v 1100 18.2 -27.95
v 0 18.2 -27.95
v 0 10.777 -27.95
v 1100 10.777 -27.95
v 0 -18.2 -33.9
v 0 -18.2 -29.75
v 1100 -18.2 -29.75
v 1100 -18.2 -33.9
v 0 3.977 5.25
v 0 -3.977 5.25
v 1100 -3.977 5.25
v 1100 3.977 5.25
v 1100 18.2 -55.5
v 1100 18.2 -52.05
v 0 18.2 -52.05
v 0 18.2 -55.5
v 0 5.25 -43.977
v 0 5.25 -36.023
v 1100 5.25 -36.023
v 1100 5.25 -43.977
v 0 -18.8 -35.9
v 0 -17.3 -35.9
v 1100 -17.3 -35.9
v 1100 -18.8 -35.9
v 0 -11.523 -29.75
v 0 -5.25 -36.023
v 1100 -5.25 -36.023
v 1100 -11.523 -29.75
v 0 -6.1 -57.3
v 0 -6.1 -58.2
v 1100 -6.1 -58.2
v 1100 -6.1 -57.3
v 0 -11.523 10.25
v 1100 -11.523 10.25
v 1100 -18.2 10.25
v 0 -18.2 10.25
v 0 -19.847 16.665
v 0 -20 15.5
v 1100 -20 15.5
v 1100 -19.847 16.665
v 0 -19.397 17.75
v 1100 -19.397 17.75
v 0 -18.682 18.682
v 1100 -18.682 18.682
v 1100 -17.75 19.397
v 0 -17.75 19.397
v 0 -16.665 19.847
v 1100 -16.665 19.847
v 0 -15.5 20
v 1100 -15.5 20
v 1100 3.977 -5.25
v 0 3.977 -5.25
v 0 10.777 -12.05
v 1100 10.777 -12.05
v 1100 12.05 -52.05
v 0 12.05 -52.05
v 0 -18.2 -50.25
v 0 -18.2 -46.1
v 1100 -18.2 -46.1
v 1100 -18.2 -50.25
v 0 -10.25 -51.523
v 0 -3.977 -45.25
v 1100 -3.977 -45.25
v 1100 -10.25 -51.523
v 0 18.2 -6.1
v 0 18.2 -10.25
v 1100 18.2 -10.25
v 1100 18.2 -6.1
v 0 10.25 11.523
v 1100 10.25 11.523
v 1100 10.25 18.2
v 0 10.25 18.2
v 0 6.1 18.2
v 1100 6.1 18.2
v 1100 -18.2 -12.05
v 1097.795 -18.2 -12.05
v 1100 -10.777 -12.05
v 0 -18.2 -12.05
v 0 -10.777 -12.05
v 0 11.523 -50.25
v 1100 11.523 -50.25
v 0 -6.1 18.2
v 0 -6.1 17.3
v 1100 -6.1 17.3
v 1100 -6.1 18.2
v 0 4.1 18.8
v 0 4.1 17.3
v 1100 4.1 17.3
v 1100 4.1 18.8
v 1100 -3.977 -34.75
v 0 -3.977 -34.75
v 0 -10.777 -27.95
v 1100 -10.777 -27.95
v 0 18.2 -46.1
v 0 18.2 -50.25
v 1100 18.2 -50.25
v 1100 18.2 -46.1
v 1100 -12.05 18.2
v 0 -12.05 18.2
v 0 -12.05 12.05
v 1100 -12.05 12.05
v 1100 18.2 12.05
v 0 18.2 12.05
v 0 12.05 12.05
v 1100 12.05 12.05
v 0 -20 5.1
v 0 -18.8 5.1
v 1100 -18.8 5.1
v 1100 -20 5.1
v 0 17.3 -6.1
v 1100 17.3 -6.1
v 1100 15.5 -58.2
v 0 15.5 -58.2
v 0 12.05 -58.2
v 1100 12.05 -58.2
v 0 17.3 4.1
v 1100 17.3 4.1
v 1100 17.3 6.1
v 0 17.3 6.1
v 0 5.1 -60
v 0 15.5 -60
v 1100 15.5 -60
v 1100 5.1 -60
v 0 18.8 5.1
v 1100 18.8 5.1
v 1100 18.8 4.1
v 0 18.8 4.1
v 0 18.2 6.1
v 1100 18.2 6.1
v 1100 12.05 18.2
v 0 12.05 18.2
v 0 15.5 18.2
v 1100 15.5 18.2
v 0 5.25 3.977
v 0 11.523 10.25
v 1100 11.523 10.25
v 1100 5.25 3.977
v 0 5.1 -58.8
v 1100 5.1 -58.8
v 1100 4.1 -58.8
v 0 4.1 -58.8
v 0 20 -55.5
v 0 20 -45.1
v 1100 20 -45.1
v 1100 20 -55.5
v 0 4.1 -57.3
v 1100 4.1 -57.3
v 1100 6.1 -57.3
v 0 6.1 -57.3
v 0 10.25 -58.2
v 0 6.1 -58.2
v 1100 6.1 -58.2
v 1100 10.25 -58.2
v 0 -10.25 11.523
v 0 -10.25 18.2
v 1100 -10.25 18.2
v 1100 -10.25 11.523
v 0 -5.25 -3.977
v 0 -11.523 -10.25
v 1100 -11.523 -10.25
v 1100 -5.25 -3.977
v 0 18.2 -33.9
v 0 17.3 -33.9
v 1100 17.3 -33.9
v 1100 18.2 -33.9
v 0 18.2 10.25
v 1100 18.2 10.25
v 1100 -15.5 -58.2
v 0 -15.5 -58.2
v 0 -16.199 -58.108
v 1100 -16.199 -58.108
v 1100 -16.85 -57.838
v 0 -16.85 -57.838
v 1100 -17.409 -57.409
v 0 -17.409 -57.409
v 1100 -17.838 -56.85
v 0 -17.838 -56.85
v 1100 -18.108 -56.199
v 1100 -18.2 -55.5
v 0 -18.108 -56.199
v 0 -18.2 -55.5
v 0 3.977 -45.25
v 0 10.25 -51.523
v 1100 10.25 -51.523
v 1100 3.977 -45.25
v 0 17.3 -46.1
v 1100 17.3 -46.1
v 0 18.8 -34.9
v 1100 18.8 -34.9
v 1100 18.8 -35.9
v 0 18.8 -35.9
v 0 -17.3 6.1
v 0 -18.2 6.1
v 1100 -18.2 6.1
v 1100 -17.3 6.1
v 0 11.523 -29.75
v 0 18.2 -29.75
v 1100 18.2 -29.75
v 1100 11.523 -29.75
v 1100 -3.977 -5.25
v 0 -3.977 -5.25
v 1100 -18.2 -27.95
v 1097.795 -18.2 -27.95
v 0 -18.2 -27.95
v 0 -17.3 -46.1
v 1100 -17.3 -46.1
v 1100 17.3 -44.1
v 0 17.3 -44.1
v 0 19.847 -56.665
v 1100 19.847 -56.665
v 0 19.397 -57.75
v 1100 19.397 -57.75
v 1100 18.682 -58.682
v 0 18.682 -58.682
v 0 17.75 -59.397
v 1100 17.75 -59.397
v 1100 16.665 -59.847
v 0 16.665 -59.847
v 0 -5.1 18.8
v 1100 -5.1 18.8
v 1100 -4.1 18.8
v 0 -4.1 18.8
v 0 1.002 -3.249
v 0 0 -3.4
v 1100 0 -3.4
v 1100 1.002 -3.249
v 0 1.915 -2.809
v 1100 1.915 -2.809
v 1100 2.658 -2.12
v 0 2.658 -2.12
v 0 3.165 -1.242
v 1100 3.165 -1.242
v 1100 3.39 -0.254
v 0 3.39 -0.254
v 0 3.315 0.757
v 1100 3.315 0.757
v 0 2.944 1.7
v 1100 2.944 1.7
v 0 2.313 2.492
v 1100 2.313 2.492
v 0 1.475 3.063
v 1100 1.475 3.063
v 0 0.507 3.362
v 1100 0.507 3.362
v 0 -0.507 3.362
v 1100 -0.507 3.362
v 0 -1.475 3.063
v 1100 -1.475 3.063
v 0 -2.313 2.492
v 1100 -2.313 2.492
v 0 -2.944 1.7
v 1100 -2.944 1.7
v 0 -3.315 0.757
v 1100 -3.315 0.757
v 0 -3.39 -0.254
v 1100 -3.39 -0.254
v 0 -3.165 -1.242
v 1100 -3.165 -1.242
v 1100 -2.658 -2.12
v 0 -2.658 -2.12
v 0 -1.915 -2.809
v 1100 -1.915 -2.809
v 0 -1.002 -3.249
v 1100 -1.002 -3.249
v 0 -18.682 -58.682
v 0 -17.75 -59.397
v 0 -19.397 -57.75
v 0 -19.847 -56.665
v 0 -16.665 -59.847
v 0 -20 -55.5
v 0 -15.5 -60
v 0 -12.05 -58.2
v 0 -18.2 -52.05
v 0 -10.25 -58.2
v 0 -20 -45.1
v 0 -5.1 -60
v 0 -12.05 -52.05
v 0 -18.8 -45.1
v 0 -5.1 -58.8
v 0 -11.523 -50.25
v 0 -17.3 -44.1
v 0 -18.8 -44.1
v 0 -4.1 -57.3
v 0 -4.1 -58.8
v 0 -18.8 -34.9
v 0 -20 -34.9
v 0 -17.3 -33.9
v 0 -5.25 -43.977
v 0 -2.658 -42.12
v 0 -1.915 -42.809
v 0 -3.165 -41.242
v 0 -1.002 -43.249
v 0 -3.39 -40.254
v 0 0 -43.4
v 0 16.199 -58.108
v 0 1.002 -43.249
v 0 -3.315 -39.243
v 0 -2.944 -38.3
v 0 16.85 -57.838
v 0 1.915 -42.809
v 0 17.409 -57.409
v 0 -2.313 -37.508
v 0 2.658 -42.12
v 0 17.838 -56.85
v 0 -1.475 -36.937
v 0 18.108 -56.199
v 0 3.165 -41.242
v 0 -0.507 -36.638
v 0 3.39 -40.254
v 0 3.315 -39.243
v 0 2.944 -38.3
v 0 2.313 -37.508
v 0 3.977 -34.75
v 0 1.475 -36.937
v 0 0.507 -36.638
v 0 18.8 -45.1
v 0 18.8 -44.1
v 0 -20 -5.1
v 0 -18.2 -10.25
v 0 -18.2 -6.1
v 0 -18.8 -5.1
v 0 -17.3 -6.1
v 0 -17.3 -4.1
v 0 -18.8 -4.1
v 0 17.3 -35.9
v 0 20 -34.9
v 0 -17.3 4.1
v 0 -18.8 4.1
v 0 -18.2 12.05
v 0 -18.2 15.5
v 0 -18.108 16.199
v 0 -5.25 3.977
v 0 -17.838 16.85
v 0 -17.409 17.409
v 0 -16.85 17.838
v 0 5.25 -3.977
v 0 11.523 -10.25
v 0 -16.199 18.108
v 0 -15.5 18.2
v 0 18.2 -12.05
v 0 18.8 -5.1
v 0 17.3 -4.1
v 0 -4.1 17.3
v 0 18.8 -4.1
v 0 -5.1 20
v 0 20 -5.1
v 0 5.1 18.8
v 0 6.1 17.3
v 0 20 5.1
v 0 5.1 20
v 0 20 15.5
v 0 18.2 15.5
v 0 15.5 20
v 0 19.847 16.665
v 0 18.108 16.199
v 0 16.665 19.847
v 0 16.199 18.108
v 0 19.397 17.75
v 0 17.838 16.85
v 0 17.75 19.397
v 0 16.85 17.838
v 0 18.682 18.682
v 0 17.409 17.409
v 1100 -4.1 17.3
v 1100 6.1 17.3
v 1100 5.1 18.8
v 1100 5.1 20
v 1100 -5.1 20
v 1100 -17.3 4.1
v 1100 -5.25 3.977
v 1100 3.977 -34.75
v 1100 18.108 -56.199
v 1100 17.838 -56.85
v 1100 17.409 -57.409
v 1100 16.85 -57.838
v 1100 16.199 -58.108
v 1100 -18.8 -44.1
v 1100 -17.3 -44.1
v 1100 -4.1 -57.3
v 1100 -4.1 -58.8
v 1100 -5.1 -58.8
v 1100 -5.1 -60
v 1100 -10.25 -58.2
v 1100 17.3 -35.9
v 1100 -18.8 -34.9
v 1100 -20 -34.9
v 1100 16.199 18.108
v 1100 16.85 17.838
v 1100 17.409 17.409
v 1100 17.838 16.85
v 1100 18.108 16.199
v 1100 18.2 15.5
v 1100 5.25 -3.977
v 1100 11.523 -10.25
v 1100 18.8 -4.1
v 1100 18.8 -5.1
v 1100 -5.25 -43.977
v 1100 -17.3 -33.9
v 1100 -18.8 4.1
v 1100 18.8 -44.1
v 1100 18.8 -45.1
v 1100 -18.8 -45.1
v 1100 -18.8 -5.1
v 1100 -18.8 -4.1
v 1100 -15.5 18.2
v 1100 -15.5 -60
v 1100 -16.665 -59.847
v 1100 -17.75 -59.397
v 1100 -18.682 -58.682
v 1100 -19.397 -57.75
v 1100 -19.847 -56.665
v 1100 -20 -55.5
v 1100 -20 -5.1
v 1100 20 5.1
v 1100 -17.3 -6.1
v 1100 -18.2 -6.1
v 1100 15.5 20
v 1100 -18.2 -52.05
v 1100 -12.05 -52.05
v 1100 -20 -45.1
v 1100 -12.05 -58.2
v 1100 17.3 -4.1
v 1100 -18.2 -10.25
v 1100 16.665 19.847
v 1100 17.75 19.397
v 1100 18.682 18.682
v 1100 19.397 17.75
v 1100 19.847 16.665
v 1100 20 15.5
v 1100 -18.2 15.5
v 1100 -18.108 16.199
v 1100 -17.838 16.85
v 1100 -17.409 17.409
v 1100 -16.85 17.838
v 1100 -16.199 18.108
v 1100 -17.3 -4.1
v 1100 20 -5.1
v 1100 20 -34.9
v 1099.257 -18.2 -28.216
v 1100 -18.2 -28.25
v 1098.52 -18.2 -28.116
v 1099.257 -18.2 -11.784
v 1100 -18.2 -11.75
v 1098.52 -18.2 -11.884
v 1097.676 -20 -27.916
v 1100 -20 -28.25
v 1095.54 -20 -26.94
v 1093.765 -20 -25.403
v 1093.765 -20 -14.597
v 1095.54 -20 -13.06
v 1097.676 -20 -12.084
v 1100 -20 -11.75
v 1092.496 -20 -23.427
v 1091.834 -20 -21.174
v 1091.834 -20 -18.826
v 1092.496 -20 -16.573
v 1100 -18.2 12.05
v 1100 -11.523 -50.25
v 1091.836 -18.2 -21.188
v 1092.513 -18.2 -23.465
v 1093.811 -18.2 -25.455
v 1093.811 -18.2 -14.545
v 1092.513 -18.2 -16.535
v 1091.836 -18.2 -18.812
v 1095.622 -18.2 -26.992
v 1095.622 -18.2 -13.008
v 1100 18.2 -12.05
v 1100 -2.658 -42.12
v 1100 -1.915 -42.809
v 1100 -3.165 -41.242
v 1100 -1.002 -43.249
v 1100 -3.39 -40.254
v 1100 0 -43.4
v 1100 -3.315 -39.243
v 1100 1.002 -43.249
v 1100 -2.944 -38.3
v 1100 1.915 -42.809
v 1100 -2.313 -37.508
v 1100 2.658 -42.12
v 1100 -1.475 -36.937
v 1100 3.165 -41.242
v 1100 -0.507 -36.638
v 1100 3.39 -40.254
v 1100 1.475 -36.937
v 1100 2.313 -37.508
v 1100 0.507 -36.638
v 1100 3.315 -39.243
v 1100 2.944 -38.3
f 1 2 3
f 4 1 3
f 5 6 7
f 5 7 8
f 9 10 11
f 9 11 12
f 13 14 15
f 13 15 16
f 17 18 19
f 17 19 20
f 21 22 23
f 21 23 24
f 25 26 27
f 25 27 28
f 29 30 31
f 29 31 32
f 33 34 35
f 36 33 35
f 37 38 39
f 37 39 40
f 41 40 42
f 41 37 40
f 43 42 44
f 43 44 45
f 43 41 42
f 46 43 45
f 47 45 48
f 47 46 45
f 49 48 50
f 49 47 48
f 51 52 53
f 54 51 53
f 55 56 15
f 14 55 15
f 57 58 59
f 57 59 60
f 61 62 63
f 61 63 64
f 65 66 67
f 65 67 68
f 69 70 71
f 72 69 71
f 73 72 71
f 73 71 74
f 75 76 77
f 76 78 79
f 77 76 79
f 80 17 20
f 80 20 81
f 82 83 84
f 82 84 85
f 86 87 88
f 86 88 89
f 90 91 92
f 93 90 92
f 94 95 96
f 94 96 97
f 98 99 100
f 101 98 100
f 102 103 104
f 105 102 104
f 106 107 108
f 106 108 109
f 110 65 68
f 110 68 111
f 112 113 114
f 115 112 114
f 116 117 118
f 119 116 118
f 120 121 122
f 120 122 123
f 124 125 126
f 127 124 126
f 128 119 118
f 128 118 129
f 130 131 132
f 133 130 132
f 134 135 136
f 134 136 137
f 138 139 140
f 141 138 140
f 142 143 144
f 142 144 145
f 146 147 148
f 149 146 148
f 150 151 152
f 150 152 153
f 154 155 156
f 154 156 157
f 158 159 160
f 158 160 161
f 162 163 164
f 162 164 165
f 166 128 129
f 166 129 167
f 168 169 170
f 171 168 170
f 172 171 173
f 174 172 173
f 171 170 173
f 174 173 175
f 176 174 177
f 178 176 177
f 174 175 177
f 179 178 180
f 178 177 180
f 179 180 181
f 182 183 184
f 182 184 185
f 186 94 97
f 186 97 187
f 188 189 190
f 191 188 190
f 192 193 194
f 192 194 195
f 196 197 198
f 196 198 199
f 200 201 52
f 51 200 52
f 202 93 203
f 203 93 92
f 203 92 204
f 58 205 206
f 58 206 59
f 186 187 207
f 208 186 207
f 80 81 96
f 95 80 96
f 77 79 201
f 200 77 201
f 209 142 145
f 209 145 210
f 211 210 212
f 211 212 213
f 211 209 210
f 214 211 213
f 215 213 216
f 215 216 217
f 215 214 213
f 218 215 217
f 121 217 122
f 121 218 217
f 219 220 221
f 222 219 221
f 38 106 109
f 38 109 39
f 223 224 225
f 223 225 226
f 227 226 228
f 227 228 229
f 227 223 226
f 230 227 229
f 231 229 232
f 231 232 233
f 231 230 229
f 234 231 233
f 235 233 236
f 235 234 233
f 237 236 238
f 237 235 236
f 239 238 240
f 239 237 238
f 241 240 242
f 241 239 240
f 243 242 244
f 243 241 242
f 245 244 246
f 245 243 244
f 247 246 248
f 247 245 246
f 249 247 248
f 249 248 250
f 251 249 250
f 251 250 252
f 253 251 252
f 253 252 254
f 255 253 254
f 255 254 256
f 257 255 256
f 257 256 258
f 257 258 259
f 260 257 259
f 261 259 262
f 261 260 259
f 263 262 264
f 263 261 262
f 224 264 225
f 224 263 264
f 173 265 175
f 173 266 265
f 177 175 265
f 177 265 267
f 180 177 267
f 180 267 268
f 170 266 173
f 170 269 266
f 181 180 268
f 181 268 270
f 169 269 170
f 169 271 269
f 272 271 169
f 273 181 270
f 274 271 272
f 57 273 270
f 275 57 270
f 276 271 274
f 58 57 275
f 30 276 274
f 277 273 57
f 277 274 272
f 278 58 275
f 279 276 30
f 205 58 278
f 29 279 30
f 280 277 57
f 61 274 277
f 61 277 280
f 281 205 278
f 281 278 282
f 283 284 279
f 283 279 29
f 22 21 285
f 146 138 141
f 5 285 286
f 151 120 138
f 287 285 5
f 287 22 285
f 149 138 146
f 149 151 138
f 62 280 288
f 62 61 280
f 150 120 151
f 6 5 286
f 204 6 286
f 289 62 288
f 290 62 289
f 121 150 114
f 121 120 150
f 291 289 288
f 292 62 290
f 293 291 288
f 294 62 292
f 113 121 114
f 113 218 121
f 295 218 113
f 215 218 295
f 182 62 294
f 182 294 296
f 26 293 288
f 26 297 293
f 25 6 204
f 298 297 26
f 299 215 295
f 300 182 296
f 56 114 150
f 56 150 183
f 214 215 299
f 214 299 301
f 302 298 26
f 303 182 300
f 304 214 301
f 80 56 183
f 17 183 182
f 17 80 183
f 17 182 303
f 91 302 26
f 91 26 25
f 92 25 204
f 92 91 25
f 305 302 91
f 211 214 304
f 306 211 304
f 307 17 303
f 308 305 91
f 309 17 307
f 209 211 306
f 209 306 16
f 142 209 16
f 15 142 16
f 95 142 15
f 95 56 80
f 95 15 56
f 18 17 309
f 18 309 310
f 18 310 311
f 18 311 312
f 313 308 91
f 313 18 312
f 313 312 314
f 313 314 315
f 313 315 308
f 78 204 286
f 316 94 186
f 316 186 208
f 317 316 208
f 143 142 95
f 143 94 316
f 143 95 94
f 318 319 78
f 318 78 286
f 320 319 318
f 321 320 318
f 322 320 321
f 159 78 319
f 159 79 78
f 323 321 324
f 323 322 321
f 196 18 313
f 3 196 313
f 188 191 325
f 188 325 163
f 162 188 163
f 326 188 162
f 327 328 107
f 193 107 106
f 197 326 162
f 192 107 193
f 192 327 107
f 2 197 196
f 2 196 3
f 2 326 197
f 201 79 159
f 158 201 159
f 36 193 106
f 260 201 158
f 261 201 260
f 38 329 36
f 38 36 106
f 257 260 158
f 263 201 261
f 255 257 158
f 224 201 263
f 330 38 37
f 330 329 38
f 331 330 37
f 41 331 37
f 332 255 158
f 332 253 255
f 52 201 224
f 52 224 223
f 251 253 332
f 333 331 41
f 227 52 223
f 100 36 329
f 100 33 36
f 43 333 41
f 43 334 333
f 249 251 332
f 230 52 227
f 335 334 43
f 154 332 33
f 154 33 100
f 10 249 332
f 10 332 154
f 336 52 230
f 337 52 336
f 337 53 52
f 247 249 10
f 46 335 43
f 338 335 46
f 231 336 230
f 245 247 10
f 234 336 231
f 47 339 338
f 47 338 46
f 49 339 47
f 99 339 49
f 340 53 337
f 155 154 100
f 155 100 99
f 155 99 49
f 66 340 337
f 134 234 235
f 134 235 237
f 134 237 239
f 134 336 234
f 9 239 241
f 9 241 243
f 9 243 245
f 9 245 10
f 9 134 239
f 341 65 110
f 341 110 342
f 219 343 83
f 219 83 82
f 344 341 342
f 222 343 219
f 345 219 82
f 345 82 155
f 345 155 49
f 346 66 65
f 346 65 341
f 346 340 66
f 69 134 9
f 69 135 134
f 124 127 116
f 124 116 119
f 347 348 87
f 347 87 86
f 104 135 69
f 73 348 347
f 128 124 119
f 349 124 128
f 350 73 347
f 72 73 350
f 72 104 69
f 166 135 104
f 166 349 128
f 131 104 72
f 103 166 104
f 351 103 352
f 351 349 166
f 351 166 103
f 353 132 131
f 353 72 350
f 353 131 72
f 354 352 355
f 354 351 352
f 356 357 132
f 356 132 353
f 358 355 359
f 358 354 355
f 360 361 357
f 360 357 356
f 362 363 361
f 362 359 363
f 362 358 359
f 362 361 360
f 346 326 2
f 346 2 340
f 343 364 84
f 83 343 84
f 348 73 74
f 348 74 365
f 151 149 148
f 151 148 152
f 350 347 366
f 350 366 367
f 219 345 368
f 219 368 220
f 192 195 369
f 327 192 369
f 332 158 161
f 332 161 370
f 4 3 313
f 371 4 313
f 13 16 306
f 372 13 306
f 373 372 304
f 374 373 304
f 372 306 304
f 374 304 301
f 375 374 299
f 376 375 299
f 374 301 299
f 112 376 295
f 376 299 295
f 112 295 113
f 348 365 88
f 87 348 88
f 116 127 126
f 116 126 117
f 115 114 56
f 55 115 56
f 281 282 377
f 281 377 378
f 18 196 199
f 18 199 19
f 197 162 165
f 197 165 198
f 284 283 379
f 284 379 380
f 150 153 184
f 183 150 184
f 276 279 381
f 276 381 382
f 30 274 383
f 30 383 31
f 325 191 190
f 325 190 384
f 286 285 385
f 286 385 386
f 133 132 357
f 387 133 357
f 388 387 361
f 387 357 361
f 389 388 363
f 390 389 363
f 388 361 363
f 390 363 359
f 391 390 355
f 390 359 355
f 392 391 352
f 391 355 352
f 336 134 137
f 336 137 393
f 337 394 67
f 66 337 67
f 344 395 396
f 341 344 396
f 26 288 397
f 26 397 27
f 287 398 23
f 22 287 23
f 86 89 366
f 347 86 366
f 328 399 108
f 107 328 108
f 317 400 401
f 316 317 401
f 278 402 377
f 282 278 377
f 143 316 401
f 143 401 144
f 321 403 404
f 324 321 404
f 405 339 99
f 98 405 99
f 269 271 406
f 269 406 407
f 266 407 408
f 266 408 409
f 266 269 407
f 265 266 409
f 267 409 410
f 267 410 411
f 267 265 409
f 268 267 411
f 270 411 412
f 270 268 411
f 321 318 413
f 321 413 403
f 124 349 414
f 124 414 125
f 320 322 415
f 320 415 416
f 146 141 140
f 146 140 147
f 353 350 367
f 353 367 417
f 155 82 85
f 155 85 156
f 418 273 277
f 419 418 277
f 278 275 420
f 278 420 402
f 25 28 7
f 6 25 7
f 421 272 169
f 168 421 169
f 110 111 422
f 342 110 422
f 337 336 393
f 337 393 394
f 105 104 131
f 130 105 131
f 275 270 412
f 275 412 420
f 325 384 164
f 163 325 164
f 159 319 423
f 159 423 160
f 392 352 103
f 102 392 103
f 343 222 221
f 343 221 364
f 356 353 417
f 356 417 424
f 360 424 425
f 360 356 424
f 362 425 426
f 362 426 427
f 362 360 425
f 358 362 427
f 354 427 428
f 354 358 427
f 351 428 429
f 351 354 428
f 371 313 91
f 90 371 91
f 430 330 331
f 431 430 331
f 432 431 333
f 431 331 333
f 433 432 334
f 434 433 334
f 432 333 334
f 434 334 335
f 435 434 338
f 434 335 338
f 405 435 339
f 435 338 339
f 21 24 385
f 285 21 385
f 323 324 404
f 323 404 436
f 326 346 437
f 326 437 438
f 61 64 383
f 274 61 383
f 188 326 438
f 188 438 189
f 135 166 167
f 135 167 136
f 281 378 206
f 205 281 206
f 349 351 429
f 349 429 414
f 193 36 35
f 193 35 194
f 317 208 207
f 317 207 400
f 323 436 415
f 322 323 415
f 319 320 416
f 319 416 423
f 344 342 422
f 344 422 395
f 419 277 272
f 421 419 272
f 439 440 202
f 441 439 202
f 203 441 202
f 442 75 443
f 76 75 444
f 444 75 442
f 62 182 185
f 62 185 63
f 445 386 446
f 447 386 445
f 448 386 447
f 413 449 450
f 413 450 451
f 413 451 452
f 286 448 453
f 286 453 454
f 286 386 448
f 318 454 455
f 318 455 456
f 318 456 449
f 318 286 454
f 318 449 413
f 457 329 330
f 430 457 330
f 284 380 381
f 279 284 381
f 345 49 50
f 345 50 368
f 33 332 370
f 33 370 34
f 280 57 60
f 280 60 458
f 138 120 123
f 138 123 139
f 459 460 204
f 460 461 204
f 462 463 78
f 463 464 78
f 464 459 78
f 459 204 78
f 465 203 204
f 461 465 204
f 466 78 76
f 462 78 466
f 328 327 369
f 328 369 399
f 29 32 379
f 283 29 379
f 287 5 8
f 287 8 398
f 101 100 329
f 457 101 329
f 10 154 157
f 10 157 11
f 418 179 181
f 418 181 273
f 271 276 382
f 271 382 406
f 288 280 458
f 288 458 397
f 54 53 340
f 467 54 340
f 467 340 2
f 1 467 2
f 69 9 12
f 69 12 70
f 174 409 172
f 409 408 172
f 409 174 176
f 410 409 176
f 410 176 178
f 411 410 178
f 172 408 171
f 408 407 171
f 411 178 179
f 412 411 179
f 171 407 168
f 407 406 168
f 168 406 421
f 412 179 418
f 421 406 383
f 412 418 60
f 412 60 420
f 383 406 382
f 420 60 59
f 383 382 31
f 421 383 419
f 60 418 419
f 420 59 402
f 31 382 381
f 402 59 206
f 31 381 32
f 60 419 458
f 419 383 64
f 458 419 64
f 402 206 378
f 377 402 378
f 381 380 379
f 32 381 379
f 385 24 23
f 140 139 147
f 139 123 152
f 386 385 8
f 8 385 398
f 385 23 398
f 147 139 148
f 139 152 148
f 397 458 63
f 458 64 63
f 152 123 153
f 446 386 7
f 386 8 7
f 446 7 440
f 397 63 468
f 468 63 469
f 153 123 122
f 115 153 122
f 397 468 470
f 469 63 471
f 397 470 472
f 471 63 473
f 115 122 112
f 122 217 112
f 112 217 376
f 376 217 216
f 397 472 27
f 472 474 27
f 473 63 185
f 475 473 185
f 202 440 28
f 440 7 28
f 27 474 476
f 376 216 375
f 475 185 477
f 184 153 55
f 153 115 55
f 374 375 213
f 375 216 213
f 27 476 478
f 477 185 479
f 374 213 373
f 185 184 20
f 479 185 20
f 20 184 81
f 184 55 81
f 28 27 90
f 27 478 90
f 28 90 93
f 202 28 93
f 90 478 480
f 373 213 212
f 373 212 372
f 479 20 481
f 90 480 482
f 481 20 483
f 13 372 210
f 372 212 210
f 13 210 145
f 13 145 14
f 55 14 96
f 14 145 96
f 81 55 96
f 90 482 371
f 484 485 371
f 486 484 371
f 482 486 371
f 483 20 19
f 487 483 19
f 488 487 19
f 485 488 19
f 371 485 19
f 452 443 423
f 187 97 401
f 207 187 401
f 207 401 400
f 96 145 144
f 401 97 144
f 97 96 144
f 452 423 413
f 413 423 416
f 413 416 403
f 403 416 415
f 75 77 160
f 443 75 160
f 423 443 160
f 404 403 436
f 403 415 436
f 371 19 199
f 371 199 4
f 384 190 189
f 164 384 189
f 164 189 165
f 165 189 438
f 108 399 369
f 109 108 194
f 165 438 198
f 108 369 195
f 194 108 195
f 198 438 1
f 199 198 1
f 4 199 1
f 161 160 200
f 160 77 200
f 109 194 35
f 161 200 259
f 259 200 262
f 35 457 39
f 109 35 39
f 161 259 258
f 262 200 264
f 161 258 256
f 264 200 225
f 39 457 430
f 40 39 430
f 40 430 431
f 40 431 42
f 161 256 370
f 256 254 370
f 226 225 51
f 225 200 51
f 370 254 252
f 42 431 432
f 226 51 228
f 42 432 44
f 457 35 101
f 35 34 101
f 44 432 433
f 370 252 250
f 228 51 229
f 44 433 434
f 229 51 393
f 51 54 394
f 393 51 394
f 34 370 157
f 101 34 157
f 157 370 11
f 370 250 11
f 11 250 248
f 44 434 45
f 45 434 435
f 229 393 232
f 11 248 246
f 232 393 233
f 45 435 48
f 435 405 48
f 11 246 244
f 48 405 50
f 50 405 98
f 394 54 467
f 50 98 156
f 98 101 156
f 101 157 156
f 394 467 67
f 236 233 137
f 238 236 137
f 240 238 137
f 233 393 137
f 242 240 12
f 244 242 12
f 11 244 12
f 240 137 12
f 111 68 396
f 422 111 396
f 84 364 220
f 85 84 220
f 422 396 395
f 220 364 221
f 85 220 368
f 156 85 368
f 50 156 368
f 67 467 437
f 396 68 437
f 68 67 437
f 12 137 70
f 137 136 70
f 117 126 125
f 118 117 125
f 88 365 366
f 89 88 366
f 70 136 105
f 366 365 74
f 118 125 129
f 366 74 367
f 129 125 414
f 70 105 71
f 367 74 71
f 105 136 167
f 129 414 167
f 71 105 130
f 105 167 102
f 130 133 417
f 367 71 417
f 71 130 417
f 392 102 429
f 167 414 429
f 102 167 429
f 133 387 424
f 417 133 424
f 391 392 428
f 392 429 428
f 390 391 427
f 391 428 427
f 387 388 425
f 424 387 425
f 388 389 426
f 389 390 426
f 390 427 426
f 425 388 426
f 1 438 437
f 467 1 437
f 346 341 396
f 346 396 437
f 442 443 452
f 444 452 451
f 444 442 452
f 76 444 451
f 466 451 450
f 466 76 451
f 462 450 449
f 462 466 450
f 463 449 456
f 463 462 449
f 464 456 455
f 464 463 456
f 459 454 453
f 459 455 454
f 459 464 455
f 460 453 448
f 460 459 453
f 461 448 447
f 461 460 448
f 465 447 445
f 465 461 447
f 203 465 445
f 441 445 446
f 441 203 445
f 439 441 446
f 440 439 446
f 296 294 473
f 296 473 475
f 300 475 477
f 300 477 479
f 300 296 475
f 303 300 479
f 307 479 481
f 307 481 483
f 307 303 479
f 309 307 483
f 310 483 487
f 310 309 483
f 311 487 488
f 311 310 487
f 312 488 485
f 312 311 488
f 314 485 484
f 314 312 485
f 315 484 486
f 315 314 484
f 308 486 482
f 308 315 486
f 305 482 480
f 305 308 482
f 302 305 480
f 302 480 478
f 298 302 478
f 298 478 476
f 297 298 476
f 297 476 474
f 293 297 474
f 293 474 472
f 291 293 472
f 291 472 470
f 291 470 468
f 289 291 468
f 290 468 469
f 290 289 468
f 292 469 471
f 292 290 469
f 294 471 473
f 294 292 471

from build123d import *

# Parameters (mm, degrees)
SKETCH_110_R                     = 3.4
MEMBER_4080_2_0_4080_2_0_1_DEPTH = 1100
CUT_EXTRUDE_1_REACH              = 1104.297


with BuildPart() as part:
    # 草图110 → Member 4080-_2.0 _4080-_2.0_1 (new body)
    with BuildSketch(Plane(origin=(0, 0, 0), x_dir=(0, 0, -1), z_dir=(1, 0, 0))):
        with BuildLine():
            Line((-5.25, -3.977207794), (-5.25, 3.977207794))
            Line((-5.25, 3.977207794), (-11.522792206, 10.25))
            Line((-11.522792206, 10.25), (-18.2, 10.25))
            Line((-18.2, 10.25), (-18.2, 6.1))
            Line((-18.2, 6.1), (-17.3, 6.1))
            Line((-17.3, 6.1), (-17.3, 4.1))
            Line((-17.3, 4.1), (-18.8, 4.1))
            Line((-18.8, 4.1), (-18.8, 5.1))
            Line((-18.8, 5.1), (-20, 5.1))
            Line((-20, 5.1), (-20, 15.5))
            ThreePointArc((-20, 15.5), (-18.681980515, 18.681980515), (-15.5, 20))
            Line((-15.5, 20), (-5.1, 20))
            Line((-5.1, 20), (-5.1, 18.8))
            Line((-5.1, 18.8), (-4.1, 18.8))
            Line((-4.1, 18.8), (-4.1, 17.3))
            Line((-4.1, 17.3), (-6.1, 17.3))
            Line((-6.1, 17.3), (-6.1, 18.2))
            Line((-6.1, 18.2), (-10.25, 18.2))
            Line((-10.25, 18.2), (-10.25, 11.522792206))
            Line((-10.25, 11.522792206), (-3.977207794, 5.25))
            Line((-3.977207794, 5.25), (3.977207794, 5.25))
            Line((3.977207794, 5.25), (10.25, 11.522792206))
            Line((10.25, 11.522792206), (10.25, 18.2))
            Line((10.25, 18.2), (6.1, 18.2))
            Line((6.1, 18.2), (6.1, 17.3))
            Line((6.1, 17.3), (4.1, 17.3))
            Line((4.1, 17.3), (4.1, 18.8))
            Line((4.1, 18.8), (5.1, 18.8))
            Line((5.1, 18.8), (5.1, 20))
            Line((5.1, 20), (15.5, 20))
            Line((15.5, 20), (24.5, 20))
            Line((24.5, 20), (34.9, 20))
            Line((34.9, 20), (34.9, 18.8))
            Line((34.9, 18.8), (35.9, 18.8))
            Line((35.9, 18.8), (35.9, 17.3))
            Line((35.9, 17.3), (33.9, 17.3))
            Line((33.9, 17.3), (33.9, 18.2))
            Line((33.9, 18.2), (29.75, 18.2))
            Line((29.75, 18.2), (29.75, 11.522792206))
            Line((29.75, 11.522792206), (36.022792206, 5.25))
            Line((36.022792206, 5.25), (43.977207794, 5.25))
            Line((43.977207794, 5.25), (50.25, 11.522792206))
            Line((50.25, 11.522792206), (50.25, 18.2))
            Line((50.25, 18.2), (46.1, 18.2))
            Line((46.1, 18.2), (46.1, 17.3))
            Line((46.1, 17.3), (44.1, 17.3))
            Line((44.1, 17.3), (44.1, 18.8))
            Line((44.1, 18.8), (45.1, 18.8))
            Line((45.1, 18.8), (45.1, 20))
            Line((45.1, 20), (55.5, 20))
            ThreePointArc((55.5, 20), (58.681980515, 18.681980515), (60, 15.5))
            Line((60, 15.5), (60, 5.1))
            Line((60, 5.1), (58.8, 5.1))
            Line((58.8, 5.1), (58.8, 4.1))
            Line((58.8, 4.1), (57.3, 4.1))
            Line((57.3, 4.1), (57.3, 6.1))
            Line((57.3, 6.1), (58.2, 6.1))
            Line((58.2, 6.1), (58.2, 10.25))
            Line((58.2, 10.25), (51.522792206, 10.25))
            Line((51.522792206, 10.25), (45.25, 3.977207794))
            Line((45.25, 3.977207794), (45.25, -3.977207794))
            Line((45.25, -3.977207794), (51.522792206, -10.25))
            Line((51.522792206, -10.25), (58.2, -10.25))
            Line((58.2, -10.25), (58.2, -6.1))
            Line((58.2, -6.1), (57.3, -6.1))
            Line((57.3, -6.1), (57.3, -4.1))
            Line((57.3, -4.1), (58.8, -4.1))
            Line((58.8, -4.1), (58.8, -5.1))
            Line((58.8, -5.1), (60, -5.1))
            Line((60, -5.1), (60, -15.5))
            ThreePointArc((60, -15.5), (58.681980515, -18.681980515), (55.5, -20))
            Line((55.5, -20), (45.1, -20))
            Line((45.1, -20), (45.1, -18.8))
            Line((45.1, -18.8), (44.1, -18.8))
            Line((44.1, -18.8), (44.1, -17.3))
            Line((44.1, -17.3), (46.1, -17.3))
            Line((46.1, -17.3), (46.1, -18.2))
            Line((46.1, -18.2), (50.25, -18.2))
            Line((50.25, -18.2), (50.25, -11.522792206))
            Line((50.25, -11.522792206), (43.977207794, -5.25))
            Line((43.977207794, -5.25), (36.022792206, -5.25))
            Line((36.022792206, -5.25), (29.75, -11.522792206))
            Line((29.75, -11.522792206), (29.75, -18.2))
            Line((29.75, -18.2), (33.9, -18.2))
            Line((33.9, -18.2), (33.9, -17.3))
            Line((33.9, -17.3), (35.9, -17.3))
            Line((35.9, -17.3), (35.9, -18.8))
            Line((35.9, -18.8), (34.9, -18.8))
            Line((34.9, -18.8), (34.9, -20))
            Line((34.9, -20), (24.5, -20))
            Line((24.5, -20), (15.5, -20))
            Line((15.5, -20), (5.1, -20))
            Line((5.1, -20), (5.1, -18.8))
            Line((5.1, -18.8), (4.1, -18.8))
            Line((4.1, -18.8), (4.1, -17.3))
            Line((4.1, -17.3), (6.1, -17.3))
            Line((6.1, -17.3), (6.1, -18.2))
            Line((6.1, -18.2), (10.25, -18.2))
            Line((10.25, -18.2), (10.25, -11.522792206))
            Line((10.25, -11.522792206), (3.977207794, -5.25))
            Line((3.977207794, -5.25), (-3.977207794, -5.25))
            Line((-3.977207794, -5.25), (-10.25, -11.522792206))
            Line((-10.25, -11.522792206), (-10.25, -18.2))
            Line((-10.25, -18.2), (-6.1, -18.2))
            Line((-6.1, -18.2), (-6.1, -17.3))
            Line((-6.1, -17.3), (-4.1, -17.3))
            Line((-4.1, -17.3), (-4.1, -18.8))
            Line((-4.1, -18.8), (-5.1, -18.8))
            Line((-5.1, -18.8), (-5.1, -20))
            Line((-5.1, -20), (-15.5, -20))
            ThreePointArc((-15.5, -20), (-18.681980515, -18.681980515), (-20, -15.5))
            Line((-20, -15.5), (-20, -5.1))
            Line((-20, -5.1), (-18.8, -5.1))
            Line((-18.8, -5.1), (-18.8, -4.1))
            Line((-18.8, -4.1), (-17.3, -4.1))
            Line((-17.3, -4.1), (-17.3, -6.1))
            Line((-17.3, -6.1), (-18.2, -6.1))
            Line((-18.2, -6.1), (-18.2, -10.25))
            Line((-18.2, -10.25), (-11.522792206, -10.25))
            Line((-11.522792206, -10.25), (-5.25, -3.977207794))
        make_face()
        Circle(SKETCH_110_R, mode=Mode.SUBTRACT)
        with Locations((40, 0)):
            Circle(SKETCH_110_R, mode=Mode.SUBTRACT)
        with BuildLine():
            Line((-12.05, 12.05), (-18.2, 12.05))
            Line((-18.2, 12.05), (-18.2, 15.5))
            ThreePointArc((-18.2, 15.5), (-17.409188309, 17.409188309), (-15.5, 18.2))
            Line((-15.5, 18.2), (-12.05, 18.2))
            Line((-12.05, 18.2), (-12.05, 12.05))
        make_face(mode=Mode.SUBTRACT)
        Polygon((5.25, 3.977207794), (11.522792206, 10.25), (12.05, 10.777207794), (12.05, 12.05), (12.05, 18.2), (15.5, 18.2), (24.5, 18.2), (27.95, 18.2), (27.95, 12.05), (27.95, 10.777207794), (28.477207794, 10.25), (34.75, 3.977207794), (34.75, -3.977207794), (28.477207794, -10.25), (27.95, -10.777207794), (27.95, -12.05), (27.95, -18.2), (24.5, -18.2), (15.5, -18.2), (12.05, -18.2), (12.05, -12.05), (12.05, -10.777207794), (11.522792206, -10.25), (5.25, -3.977207794), align=None, mode=Mode.SUBTRACT)
        with BuildLine():
            Line((-12.05, -12.05), (-12.05, -18.2))
            Line((-12.05, -18.2), (-15.5, -18.2))
            ThreePointArc((-15.5, -18.2), (-17.409188309, -17.409188309), (-18.2, -15.5))
            Line((-18.2, -15.5), (-18.2, -12.05))
            Line((-18.2, -12.05), (-12.05, -12.05))
        make_face(mode=Mode.SUBTRACT)
        with BuildLine():
            Line((52.05, -12.05), (58.2, -12.05))
            Line((58.2, -12.05), (58.2, -15.5))
            ThreePointArc((58.2, -15.5), (57.409188309, -17.409188309), (55.5, -18.2))
            Line((55.5, -18.2), (52.05, -18.2))
            Line((52.05, -18.2), (52.05, -12.05))
        make_face(mode=Mode.SUBTRACT)
        with BuildLine():
            Line((52.05, 12.05), (52.05, 18.2))
            Line((52.05, 18.2), (55.5, 18.2))
            ThreePointArc((55.5, 18.2), (57.409188309, 17.409188309), (58.2, 15.5))
            Line((58.2, 15.5), (58.2, 12.05))
            Line((58.2, 12.05), (52.05, 12.05))
        make_face(mode=Mode.SUBTRACT)
    extrude(amount=MEMBER_4080_2_0_4080_2_0_1_DEPTH)

    # 草图13 → 切除-拉伸1 (cut, up to next)
    with BuildSketch(Plane(origin=(0, -18.2, 0), x_dir=(1, 0, 0), z_dir=(0, 1, 0)), mode=Mode.PRIVATE) as cut_extrude_1_sk1:
        with BuildLine():
            Line((1180, 11.75), (1100, 11.75))
            ThreePointArc((1100, 11.75), (1091.75, 20), (1100, 28.25))
            Line((1100, 28.25), (1180, 28.25))
            ThreePointArc((1180, 28.25), (1188.25, 20), (1180, 11.75))
        make_face()
    cut_extrude_1_tool1 = extrude(cut_extrude_1_sk1.sketch, amount=-CUT_EXTRUDE_1_REACH, mode=Mode.PRIVATE) & part.part
    add(cut_extrude_1_tool1.solids().sort_by_distance((1140, -18.2, -20))[0], mode=Mode.SUBTRACT)


solid = part.part
